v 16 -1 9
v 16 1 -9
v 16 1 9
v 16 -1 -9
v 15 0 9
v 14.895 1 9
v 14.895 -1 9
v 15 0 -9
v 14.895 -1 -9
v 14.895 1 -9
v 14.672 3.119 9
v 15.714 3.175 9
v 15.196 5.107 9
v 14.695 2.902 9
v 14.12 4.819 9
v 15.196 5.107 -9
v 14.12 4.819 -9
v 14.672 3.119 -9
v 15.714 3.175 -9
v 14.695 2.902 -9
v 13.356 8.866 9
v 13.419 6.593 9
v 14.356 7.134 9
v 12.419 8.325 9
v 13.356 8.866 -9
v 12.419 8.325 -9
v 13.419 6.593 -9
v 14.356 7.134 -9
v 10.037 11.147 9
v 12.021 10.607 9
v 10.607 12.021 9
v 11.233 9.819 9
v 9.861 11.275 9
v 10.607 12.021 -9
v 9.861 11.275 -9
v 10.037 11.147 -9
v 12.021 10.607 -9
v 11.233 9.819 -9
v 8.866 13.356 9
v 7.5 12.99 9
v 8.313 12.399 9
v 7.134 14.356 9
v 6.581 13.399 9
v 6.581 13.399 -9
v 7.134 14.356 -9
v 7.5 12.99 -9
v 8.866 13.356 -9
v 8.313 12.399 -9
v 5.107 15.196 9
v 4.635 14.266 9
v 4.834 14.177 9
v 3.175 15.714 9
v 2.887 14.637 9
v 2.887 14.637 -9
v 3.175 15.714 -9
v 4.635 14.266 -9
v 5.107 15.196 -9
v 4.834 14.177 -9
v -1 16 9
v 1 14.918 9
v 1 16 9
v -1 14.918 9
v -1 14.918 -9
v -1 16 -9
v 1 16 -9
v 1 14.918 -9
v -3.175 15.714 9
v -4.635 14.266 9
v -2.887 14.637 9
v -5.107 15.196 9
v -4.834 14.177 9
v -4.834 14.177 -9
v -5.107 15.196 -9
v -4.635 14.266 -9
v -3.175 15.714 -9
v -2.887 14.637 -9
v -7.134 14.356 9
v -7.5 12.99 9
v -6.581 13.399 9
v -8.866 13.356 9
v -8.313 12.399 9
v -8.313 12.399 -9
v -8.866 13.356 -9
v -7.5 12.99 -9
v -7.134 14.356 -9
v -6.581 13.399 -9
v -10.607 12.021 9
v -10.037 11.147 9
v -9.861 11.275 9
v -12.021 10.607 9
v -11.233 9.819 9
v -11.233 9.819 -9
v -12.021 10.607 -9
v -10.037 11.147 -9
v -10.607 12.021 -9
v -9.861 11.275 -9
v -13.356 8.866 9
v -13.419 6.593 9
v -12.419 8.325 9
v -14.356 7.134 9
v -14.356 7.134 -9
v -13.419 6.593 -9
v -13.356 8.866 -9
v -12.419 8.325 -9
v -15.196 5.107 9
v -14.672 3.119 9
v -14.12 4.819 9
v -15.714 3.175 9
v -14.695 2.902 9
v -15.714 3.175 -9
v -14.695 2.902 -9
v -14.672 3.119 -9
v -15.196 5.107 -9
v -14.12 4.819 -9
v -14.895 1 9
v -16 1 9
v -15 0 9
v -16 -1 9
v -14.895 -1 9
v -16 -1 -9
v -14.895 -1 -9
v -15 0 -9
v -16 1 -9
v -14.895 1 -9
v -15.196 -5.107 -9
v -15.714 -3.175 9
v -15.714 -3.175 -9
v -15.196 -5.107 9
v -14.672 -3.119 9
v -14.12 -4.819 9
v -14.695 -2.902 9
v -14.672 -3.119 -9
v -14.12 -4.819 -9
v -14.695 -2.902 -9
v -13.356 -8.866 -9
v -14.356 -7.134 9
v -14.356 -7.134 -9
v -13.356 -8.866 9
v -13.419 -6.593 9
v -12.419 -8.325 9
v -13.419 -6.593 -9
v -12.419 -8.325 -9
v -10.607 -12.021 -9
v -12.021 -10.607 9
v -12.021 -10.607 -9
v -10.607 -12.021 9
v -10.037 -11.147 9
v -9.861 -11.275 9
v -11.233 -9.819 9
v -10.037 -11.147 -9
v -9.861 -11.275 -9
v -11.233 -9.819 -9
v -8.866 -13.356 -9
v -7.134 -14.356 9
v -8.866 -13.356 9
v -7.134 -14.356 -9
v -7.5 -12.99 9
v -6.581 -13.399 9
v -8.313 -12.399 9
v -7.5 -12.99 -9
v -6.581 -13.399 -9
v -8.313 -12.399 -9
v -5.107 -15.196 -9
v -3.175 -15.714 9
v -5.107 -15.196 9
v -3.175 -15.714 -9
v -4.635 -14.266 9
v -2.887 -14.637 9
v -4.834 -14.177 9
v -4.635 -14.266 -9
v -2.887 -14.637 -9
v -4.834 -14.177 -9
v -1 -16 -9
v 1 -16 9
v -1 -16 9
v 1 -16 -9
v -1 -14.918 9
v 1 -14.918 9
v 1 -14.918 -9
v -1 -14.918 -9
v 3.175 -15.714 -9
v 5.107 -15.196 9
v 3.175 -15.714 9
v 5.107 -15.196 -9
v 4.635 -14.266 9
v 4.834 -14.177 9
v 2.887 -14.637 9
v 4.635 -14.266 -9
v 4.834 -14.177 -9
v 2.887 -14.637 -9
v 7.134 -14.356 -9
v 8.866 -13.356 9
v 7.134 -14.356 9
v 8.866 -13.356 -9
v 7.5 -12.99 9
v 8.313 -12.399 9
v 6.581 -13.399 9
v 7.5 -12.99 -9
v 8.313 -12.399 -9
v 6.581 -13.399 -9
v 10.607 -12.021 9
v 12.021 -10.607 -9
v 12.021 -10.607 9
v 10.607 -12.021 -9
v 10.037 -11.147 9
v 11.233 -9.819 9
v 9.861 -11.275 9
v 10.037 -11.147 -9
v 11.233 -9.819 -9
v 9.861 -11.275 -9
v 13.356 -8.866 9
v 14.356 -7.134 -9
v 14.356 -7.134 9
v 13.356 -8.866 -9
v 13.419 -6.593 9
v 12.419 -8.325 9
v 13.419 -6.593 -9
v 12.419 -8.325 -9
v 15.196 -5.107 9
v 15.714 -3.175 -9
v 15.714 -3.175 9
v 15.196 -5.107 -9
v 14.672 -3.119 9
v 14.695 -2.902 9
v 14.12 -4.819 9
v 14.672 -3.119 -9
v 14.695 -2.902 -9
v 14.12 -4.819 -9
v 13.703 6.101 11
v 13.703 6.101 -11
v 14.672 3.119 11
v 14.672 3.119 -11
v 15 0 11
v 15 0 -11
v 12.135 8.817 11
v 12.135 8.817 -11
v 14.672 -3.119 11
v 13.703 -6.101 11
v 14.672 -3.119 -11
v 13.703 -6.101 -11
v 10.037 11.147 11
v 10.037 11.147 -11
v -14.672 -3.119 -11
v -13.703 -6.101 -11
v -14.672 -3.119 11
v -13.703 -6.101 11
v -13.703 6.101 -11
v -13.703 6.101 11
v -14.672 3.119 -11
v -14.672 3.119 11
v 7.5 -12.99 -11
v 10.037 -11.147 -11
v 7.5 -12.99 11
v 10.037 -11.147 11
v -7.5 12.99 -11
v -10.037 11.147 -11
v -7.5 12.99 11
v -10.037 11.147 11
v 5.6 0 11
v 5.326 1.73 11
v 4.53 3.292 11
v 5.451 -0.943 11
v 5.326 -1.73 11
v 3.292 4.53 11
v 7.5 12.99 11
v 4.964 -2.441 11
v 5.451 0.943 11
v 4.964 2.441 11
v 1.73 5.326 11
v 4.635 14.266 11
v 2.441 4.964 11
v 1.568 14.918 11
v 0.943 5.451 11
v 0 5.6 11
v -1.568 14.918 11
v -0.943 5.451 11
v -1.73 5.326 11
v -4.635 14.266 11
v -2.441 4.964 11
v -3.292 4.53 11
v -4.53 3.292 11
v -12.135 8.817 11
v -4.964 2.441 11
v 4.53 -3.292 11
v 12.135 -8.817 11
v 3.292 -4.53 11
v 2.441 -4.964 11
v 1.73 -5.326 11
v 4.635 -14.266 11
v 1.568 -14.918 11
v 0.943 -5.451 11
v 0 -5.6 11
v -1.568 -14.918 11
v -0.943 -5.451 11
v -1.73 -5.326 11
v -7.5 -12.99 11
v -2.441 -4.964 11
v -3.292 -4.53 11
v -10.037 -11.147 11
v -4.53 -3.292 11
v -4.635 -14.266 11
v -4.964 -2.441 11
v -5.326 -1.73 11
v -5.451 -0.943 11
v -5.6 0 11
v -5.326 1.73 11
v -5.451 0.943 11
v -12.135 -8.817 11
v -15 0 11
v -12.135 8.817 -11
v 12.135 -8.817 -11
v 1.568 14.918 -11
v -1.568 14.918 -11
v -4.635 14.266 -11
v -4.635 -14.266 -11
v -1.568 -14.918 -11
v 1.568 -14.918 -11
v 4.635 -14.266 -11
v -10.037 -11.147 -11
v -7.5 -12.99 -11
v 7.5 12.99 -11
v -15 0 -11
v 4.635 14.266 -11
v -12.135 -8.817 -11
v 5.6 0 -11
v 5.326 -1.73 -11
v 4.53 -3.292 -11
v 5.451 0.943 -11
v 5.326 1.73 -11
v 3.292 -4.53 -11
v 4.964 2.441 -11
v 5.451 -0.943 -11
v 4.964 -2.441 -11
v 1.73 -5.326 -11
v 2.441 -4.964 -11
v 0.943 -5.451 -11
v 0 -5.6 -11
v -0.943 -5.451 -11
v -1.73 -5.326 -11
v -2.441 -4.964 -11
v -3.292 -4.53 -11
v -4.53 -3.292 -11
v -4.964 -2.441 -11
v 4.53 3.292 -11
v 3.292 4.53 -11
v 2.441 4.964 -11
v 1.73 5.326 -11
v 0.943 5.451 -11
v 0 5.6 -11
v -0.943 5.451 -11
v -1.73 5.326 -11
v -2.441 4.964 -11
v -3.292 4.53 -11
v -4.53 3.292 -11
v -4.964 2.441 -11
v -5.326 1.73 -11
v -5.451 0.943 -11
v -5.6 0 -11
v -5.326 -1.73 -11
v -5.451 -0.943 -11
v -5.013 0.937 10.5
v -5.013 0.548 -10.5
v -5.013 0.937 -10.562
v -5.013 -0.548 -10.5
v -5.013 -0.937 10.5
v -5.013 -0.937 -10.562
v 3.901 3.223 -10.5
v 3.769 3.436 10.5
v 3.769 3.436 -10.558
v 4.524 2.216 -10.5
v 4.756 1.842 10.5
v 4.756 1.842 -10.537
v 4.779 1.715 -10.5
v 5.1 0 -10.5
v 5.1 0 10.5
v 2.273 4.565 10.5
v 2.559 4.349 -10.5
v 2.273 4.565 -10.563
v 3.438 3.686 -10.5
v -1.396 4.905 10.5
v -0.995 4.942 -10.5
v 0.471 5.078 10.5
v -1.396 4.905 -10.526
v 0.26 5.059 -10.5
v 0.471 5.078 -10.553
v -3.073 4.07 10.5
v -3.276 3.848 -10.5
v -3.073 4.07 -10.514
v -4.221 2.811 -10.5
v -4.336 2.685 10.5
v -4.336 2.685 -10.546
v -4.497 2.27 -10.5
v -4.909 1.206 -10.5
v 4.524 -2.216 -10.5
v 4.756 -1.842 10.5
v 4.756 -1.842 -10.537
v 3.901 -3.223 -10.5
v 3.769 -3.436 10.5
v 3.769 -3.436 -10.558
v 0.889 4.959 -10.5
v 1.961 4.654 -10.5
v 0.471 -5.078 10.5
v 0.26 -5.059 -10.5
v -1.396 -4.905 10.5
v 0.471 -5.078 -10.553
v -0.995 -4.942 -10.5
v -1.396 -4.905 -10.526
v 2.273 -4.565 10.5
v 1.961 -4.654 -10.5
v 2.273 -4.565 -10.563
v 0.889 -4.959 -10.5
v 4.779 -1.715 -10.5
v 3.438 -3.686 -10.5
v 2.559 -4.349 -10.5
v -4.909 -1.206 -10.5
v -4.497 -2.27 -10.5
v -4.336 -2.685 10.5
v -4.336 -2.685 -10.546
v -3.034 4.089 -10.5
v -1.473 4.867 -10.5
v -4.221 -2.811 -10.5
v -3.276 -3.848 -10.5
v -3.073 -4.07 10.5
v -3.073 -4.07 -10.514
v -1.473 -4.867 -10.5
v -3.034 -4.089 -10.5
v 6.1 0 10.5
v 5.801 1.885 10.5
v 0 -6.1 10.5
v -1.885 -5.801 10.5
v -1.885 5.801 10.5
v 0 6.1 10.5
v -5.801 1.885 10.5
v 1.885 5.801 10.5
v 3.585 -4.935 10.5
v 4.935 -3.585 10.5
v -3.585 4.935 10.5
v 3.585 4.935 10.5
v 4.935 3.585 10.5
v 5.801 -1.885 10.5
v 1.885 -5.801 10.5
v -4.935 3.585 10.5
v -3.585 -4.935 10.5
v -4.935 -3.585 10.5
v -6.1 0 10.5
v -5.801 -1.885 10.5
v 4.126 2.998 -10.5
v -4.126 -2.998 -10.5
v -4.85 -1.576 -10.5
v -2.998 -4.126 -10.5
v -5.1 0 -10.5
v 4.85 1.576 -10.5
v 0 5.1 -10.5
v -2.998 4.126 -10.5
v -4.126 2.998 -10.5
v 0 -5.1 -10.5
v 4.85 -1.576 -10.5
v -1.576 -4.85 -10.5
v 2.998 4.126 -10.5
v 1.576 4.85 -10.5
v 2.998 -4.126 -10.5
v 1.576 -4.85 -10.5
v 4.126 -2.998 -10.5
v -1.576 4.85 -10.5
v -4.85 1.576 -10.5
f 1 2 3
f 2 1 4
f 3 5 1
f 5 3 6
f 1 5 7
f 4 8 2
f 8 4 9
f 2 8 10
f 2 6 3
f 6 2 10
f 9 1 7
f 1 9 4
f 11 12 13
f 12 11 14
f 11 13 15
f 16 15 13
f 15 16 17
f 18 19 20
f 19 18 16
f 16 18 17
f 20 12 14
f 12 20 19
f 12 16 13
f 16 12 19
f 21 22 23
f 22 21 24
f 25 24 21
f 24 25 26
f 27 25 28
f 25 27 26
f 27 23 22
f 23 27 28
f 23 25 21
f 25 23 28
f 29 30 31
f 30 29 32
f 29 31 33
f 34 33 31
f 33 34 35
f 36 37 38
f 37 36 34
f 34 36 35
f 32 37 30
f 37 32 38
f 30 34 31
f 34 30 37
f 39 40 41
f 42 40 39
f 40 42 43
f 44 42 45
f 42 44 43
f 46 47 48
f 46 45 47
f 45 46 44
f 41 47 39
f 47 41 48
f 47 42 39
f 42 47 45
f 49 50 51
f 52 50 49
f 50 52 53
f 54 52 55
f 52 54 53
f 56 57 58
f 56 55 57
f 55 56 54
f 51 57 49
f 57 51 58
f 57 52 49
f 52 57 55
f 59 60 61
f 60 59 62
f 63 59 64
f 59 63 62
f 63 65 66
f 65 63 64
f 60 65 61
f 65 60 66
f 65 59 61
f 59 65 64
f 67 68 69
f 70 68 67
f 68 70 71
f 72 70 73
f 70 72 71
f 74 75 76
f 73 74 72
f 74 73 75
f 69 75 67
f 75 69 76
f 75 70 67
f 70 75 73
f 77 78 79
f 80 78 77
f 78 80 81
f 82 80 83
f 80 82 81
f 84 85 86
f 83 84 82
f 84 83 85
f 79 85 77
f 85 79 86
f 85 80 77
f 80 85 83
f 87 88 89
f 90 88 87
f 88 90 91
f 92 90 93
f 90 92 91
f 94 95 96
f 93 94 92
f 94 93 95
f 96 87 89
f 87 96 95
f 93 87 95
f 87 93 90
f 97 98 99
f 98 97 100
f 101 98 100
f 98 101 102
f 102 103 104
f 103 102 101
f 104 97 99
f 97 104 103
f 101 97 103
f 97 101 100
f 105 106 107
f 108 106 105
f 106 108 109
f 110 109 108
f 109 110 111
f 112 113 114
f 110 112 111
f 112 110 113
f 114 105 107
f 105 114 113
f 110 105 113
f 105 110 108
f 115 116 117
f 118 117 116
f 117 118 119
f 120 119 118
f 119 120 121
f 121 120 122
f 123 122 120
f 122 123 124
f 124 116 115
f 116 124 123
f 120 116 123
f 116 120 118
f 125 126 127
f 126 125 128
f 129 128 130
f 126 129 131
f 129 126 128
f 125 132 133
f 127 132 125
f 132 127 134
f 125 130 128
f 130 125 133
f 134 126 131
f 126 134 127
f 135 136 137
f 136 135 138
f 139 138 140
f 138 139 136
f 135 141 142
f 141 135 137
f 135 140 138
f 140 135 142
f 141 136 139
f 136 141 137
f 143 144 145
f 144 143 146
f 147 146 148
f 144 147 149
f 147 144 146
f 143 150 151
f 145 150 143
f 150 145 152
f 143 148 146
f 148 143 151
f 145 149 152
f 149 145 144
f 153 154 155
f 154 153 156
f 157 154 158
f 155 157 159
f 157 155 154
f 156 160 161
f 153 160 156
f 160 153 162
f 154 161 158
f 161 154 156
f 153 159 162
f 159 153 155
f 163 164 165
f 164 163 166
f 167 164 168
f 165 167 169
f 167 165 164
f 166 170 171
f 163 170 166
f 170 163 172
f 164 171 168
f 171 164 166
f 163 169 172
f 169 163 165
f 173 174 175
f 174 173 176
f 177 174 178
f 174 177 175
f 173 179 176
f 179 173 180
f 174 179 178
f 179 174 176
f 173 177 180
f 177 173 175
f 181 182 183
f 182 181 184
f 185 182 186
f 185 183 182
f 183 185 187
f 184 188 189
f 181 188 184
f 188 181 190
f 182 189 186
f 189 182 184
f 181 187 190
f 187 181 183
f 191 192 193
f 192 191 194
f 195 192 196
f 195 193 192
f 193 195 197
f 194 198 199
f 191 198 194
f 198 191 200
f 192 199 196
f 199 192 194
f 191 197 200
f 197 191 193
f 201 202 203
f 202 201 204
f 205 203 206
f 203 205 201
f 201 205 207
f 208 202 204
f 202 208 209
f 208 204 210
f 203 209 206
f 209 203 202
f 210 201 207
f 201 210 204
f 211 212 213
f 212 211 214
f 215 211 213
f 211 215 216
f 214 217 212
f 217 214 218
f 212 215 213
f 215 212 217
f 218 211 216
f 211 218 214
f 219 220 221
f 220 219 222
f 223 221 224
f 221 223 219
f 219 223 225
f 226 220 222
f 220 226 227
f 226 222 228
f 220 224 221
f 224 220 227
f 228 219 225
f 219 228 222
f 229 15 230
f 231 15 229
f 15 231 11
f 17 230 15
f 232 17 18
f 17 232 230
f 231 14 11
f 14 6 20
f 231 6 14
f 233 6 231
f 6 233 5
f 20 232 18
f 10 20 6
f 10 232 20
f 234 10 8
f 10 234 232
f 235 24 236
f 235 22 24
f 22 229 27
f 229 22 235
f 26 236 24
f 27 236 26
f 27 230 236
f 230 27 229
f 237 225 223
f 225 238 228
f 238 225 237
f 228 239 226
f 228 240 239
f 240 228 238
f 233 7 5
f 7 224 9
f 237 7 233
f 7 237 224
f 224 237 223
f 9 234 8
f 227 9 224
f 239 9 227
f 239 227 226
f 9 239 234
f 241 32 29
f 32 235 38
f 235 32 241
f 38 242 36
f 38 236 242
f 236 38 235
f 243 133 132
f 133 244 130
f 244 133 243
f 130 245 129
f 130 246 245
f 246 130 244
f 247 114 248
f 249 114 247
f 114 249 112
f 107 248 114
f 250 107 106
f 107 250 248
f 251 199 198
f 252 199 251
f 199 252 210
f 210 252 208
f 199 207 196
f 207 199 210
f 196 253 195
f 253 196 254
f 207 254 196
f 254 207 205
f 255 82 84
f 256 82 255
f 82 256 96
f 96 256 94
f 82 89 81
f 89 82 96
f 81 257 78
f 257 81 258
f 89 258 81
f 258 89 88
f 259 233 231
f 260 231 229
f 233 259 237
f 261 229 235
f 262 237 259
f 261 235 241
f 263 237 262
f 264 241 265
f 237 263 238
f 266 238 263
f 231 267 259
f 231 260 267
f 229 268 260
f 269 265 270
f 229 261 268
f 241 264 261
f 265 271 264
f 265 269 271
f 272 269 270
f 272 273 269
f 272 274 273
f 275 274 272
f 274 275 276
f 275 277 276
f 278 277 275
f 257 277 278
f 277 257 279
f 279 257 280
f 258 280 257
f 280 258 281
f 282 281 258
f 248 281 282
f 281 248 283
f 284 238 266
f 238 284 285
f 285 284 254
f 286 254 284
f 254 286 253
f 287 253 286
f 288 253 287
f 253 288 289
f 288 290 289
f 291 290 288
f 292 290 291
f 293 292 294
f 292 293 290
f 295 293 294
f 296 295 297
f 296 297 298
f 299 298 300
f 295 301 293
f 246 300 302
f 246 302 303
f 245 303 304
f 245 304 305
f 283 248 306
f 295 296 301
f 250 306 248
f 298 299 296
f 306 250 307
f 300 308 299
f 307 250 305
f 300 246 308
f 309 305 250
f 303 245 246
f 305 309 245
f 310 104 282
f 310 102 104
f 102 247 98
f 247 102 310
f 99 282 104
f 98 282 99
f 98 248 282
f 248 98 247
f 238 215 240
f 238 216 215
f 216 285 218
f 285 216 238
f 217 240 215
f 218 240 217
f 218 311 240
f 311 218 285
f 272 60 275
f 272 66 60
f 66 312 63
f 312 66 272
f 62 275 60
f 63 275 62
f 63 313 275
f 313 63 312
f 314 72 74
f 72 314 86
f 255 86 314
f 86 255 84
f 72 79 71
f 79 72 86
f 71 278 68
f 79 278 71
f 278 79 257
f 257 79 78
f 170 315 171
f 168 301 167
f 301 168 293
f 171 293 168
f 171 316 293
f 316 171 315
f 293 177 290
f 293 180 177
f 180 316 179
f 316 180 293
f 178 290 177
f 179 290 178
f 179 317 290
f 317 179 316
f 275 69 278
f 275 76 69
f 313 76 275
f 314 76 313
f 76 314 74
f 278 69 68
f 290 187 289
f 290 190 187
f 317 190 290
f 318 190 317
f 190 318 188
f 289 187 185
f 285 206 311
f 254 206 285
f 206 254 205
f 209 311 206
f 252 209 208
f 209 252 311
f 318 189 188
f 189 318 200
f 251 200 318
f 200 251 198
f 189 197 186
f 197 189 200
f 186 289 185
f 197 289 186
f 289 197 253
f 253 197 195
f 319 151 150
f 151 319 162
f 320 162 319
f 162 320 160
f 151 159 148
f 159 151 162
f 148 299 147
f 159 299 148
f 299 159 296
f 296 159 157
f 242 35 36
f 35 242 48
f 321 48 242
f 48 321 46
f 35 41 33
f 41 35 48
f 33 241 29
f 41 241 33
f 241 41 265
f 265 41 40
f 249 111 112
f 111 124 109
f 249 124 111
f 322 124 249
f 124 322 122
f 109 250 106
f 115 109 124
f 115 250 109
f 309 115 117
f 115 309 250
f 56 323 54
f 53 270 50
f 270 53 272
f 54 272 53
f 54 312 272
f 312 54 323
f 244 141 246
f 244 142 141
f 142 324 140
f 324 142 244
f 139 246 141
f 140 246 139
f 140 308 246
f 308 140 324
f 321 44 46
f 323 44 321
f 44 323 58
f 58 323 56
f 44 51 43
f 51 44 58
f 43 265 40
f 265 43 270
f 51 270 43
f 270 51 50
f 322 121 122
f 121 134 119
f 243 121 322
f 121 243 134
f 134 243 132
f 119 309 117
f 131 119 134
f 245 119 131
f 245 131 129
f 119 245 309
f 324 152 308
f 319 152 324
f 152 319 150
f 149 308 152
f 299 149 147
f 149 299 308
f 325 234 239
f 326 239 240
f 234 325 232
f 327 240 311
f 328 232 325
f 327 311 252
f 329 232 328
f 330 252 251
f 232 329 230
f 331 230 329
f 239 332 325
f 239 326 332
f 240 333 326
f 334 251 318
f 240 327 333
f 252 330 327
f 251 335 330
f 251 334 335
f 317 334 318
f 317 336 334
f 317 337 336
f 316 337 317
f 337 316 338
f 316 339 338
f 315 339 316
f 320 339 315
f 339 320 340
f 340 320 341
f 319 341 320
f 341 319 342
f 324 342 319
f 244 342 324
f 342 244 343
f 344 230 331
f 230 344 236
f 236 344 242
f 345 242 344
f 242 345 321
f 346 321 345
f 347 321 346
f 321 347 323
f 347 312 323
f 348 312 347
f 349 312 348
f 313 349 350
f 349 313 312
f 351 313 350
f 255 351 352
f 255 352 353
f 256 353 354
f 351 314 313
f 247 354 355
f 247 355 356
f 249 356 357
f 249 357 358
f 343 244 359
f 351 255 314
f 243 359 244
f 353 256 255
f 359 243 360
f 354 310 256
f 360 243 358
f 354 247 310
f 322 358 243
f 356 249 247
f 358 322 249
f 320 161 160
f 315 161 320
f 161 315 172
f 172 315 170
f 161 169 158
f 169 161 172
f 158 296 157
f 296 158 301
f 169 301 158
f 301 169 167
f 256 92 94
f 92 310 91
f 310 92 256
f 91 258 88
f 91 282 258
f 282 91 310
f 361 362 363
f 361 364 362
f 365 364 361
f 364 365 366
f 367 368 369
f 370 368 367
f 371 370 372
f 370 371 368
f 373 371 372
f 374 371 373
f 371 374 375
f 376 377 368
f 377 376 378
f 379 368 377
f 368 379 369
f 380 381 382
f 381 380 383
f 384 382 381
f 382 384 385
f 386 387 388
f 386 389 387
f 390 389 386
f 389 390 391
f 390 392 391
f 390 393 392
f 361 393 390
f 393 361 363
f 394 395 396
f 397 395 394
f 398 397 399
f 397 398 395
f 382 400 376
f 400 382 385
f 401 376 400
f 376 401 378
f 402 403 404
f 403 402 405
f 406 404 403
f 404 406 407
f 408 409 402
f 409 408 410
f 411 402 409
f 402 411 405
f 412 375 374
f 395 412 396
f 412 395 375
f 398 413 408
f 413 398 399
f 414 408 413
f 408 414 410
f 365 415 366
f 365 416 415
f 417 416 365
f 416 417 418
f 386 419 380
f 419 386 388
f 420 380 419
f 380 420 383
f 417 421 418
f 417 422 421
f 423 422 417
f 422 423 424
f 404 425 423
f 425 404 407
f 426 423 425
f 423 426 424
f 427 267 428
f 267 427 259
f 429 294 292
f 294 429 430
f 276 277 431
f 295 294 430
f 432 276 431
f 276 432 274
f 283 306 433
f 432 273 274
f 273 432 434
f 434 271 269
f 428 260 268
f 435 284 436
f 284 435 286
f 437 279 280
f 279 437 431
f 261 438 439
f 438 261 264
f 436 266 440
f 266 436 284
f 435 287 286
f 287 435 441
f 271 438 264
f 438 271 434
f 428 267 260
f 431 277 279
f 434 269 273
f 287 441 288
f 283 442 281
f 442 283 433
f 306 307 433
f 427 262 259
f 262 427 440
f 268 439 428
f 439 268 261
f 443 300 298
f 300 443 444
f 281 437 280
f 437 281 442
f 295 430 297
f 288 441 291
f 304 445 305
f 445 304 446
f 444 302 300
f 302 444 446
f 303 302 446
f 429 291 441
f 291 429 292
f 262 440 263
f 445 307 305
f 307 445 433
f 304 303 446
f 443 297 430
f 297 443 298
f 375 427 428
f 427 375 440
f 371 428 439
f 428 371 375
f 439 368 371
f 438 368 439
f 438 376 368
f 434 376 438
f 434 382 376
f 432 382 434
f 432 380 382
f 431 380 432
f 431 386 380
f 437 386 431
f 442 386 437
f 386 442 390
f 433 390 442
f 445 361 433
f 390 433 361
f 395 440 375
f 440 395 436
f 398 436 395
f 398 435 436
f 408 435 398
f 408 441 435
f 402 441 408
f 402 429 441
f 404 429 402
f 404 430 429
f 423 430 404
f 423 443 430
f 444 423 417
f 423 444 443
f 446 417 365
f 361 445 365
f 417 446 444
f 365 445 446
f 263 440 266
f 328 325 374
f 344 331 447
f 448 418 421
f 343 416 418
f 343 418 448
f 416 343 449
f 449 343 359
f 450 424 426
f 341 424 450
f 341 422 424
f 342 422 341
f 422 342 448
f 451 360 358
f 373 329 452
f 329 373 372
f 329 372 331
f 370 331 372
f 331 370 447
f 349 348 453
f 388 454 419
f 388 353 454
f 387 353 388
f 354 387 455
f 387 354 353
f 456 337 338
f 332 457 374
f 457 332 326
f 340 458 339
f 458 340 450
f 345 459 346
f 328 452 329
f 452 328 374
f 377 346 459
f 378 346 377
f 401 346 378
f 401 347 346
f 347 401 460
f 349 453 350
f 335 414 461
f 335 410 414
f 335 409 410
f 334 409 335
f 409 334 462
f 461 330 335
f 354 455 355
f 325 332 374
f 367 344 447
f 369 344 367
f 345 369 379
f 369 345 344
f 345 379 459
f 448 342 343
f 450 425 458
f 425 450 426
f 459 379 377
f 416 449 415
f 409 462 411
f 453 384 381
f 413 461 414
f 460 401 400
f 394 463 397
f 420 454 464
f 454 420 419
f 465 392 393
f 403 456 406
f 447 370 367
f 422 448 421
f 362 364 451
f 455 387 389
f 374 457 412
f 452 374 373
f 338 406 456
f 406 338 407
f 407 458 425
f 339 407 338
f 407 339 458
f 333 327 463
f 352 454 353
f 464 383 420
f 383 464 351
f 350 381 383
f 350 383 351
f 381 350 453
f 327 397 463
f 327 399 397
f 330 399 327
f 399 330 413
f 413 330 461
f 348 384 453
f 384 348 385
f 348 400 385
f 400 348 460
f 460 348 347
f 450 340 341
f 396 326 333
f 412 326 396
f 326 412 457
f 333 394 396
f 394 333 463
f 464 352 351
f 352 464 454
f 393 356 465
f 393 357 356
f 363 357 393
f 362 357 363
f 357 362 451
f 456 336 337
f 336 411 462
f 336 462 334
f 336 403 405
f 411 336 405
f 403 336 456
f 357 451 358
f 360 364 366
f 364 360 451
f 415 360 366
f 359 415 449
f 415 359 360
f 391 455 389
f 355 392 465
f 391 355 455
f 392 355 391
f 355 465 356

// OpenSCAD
// Parameters
outer_diameter = 30; //[15:60:0.5]
length = 22; //[11:44:0.5]
screw_diameter = 12; //[6:24:0.5]
inner_thread_pitch = 1.75; //[1:3:0.05]
thread_tap_drill_diameter = 10.2; //[8:11.5:0.1]
end_chamfer = 1; //[0.5:3:0.1]
lead_in_chamfer_angle_deg = 45; //[20:70:1]
knurl_rib_count = 24; //[8:64:1]
knurl_rib_depth = 1; //[0.3:2.5:0.1]
knurl_rib_width = 2; //[0.8:5:0.1]
knurl_rib_height = 18; //[8:40:0.5]
overlap = 1; //[0.5:2:0.1]

// Threaded Insert - complete geometry
module threaded_insert() {
  color([0.8, 0.6, 0.2]) { // Brass color
    difference() {
      // Outer body with knurling
      union() {
        // Main cylindrical body
        cylinder(r=outer_diameter/2, h=length, center=true);
        
        // Knurl ribs
        for (i = [0:knurl_rib_count-1]) {
          rotate([0, 0, i*360/knurl_rib_count])
          translate([outer_diameter/2 + (knurl_rib_depth + overlap)/2 - overlap, 0, 0])
          cube([knurl_rib_depth + overlap, knurl_rib_width, knurl_rib_height], center=true);
        }
      }
      
      // Internal threaded bore
      cylinder(r=thread_tap_drill_diameter/2, h=length + 2*overlap, center=true);
      
      // Installation entry chamfer
      translate([0, 0, length/2 - end_chamfer/2 + overlap/2])
      cylinder(r1=thread_tap_drill_diameter/2 + end_chamfer, r2=thread_tap_drill_diameter/2, h=end_chamfer, center=true);
      
      // Lead-in chamfer
      translate([0, 0, -length/2 + end_chamfer/2 - overlap/2])
      cylinder(r1=thread_tap_drill_diameter/2 + end_chamfer, r2=thread_tap_drill_diameter/2, h=end_chamfer, center=true);
    }
  }
}

// Assembly
module assembly() {
  threaded_insert();
}

assembly();
